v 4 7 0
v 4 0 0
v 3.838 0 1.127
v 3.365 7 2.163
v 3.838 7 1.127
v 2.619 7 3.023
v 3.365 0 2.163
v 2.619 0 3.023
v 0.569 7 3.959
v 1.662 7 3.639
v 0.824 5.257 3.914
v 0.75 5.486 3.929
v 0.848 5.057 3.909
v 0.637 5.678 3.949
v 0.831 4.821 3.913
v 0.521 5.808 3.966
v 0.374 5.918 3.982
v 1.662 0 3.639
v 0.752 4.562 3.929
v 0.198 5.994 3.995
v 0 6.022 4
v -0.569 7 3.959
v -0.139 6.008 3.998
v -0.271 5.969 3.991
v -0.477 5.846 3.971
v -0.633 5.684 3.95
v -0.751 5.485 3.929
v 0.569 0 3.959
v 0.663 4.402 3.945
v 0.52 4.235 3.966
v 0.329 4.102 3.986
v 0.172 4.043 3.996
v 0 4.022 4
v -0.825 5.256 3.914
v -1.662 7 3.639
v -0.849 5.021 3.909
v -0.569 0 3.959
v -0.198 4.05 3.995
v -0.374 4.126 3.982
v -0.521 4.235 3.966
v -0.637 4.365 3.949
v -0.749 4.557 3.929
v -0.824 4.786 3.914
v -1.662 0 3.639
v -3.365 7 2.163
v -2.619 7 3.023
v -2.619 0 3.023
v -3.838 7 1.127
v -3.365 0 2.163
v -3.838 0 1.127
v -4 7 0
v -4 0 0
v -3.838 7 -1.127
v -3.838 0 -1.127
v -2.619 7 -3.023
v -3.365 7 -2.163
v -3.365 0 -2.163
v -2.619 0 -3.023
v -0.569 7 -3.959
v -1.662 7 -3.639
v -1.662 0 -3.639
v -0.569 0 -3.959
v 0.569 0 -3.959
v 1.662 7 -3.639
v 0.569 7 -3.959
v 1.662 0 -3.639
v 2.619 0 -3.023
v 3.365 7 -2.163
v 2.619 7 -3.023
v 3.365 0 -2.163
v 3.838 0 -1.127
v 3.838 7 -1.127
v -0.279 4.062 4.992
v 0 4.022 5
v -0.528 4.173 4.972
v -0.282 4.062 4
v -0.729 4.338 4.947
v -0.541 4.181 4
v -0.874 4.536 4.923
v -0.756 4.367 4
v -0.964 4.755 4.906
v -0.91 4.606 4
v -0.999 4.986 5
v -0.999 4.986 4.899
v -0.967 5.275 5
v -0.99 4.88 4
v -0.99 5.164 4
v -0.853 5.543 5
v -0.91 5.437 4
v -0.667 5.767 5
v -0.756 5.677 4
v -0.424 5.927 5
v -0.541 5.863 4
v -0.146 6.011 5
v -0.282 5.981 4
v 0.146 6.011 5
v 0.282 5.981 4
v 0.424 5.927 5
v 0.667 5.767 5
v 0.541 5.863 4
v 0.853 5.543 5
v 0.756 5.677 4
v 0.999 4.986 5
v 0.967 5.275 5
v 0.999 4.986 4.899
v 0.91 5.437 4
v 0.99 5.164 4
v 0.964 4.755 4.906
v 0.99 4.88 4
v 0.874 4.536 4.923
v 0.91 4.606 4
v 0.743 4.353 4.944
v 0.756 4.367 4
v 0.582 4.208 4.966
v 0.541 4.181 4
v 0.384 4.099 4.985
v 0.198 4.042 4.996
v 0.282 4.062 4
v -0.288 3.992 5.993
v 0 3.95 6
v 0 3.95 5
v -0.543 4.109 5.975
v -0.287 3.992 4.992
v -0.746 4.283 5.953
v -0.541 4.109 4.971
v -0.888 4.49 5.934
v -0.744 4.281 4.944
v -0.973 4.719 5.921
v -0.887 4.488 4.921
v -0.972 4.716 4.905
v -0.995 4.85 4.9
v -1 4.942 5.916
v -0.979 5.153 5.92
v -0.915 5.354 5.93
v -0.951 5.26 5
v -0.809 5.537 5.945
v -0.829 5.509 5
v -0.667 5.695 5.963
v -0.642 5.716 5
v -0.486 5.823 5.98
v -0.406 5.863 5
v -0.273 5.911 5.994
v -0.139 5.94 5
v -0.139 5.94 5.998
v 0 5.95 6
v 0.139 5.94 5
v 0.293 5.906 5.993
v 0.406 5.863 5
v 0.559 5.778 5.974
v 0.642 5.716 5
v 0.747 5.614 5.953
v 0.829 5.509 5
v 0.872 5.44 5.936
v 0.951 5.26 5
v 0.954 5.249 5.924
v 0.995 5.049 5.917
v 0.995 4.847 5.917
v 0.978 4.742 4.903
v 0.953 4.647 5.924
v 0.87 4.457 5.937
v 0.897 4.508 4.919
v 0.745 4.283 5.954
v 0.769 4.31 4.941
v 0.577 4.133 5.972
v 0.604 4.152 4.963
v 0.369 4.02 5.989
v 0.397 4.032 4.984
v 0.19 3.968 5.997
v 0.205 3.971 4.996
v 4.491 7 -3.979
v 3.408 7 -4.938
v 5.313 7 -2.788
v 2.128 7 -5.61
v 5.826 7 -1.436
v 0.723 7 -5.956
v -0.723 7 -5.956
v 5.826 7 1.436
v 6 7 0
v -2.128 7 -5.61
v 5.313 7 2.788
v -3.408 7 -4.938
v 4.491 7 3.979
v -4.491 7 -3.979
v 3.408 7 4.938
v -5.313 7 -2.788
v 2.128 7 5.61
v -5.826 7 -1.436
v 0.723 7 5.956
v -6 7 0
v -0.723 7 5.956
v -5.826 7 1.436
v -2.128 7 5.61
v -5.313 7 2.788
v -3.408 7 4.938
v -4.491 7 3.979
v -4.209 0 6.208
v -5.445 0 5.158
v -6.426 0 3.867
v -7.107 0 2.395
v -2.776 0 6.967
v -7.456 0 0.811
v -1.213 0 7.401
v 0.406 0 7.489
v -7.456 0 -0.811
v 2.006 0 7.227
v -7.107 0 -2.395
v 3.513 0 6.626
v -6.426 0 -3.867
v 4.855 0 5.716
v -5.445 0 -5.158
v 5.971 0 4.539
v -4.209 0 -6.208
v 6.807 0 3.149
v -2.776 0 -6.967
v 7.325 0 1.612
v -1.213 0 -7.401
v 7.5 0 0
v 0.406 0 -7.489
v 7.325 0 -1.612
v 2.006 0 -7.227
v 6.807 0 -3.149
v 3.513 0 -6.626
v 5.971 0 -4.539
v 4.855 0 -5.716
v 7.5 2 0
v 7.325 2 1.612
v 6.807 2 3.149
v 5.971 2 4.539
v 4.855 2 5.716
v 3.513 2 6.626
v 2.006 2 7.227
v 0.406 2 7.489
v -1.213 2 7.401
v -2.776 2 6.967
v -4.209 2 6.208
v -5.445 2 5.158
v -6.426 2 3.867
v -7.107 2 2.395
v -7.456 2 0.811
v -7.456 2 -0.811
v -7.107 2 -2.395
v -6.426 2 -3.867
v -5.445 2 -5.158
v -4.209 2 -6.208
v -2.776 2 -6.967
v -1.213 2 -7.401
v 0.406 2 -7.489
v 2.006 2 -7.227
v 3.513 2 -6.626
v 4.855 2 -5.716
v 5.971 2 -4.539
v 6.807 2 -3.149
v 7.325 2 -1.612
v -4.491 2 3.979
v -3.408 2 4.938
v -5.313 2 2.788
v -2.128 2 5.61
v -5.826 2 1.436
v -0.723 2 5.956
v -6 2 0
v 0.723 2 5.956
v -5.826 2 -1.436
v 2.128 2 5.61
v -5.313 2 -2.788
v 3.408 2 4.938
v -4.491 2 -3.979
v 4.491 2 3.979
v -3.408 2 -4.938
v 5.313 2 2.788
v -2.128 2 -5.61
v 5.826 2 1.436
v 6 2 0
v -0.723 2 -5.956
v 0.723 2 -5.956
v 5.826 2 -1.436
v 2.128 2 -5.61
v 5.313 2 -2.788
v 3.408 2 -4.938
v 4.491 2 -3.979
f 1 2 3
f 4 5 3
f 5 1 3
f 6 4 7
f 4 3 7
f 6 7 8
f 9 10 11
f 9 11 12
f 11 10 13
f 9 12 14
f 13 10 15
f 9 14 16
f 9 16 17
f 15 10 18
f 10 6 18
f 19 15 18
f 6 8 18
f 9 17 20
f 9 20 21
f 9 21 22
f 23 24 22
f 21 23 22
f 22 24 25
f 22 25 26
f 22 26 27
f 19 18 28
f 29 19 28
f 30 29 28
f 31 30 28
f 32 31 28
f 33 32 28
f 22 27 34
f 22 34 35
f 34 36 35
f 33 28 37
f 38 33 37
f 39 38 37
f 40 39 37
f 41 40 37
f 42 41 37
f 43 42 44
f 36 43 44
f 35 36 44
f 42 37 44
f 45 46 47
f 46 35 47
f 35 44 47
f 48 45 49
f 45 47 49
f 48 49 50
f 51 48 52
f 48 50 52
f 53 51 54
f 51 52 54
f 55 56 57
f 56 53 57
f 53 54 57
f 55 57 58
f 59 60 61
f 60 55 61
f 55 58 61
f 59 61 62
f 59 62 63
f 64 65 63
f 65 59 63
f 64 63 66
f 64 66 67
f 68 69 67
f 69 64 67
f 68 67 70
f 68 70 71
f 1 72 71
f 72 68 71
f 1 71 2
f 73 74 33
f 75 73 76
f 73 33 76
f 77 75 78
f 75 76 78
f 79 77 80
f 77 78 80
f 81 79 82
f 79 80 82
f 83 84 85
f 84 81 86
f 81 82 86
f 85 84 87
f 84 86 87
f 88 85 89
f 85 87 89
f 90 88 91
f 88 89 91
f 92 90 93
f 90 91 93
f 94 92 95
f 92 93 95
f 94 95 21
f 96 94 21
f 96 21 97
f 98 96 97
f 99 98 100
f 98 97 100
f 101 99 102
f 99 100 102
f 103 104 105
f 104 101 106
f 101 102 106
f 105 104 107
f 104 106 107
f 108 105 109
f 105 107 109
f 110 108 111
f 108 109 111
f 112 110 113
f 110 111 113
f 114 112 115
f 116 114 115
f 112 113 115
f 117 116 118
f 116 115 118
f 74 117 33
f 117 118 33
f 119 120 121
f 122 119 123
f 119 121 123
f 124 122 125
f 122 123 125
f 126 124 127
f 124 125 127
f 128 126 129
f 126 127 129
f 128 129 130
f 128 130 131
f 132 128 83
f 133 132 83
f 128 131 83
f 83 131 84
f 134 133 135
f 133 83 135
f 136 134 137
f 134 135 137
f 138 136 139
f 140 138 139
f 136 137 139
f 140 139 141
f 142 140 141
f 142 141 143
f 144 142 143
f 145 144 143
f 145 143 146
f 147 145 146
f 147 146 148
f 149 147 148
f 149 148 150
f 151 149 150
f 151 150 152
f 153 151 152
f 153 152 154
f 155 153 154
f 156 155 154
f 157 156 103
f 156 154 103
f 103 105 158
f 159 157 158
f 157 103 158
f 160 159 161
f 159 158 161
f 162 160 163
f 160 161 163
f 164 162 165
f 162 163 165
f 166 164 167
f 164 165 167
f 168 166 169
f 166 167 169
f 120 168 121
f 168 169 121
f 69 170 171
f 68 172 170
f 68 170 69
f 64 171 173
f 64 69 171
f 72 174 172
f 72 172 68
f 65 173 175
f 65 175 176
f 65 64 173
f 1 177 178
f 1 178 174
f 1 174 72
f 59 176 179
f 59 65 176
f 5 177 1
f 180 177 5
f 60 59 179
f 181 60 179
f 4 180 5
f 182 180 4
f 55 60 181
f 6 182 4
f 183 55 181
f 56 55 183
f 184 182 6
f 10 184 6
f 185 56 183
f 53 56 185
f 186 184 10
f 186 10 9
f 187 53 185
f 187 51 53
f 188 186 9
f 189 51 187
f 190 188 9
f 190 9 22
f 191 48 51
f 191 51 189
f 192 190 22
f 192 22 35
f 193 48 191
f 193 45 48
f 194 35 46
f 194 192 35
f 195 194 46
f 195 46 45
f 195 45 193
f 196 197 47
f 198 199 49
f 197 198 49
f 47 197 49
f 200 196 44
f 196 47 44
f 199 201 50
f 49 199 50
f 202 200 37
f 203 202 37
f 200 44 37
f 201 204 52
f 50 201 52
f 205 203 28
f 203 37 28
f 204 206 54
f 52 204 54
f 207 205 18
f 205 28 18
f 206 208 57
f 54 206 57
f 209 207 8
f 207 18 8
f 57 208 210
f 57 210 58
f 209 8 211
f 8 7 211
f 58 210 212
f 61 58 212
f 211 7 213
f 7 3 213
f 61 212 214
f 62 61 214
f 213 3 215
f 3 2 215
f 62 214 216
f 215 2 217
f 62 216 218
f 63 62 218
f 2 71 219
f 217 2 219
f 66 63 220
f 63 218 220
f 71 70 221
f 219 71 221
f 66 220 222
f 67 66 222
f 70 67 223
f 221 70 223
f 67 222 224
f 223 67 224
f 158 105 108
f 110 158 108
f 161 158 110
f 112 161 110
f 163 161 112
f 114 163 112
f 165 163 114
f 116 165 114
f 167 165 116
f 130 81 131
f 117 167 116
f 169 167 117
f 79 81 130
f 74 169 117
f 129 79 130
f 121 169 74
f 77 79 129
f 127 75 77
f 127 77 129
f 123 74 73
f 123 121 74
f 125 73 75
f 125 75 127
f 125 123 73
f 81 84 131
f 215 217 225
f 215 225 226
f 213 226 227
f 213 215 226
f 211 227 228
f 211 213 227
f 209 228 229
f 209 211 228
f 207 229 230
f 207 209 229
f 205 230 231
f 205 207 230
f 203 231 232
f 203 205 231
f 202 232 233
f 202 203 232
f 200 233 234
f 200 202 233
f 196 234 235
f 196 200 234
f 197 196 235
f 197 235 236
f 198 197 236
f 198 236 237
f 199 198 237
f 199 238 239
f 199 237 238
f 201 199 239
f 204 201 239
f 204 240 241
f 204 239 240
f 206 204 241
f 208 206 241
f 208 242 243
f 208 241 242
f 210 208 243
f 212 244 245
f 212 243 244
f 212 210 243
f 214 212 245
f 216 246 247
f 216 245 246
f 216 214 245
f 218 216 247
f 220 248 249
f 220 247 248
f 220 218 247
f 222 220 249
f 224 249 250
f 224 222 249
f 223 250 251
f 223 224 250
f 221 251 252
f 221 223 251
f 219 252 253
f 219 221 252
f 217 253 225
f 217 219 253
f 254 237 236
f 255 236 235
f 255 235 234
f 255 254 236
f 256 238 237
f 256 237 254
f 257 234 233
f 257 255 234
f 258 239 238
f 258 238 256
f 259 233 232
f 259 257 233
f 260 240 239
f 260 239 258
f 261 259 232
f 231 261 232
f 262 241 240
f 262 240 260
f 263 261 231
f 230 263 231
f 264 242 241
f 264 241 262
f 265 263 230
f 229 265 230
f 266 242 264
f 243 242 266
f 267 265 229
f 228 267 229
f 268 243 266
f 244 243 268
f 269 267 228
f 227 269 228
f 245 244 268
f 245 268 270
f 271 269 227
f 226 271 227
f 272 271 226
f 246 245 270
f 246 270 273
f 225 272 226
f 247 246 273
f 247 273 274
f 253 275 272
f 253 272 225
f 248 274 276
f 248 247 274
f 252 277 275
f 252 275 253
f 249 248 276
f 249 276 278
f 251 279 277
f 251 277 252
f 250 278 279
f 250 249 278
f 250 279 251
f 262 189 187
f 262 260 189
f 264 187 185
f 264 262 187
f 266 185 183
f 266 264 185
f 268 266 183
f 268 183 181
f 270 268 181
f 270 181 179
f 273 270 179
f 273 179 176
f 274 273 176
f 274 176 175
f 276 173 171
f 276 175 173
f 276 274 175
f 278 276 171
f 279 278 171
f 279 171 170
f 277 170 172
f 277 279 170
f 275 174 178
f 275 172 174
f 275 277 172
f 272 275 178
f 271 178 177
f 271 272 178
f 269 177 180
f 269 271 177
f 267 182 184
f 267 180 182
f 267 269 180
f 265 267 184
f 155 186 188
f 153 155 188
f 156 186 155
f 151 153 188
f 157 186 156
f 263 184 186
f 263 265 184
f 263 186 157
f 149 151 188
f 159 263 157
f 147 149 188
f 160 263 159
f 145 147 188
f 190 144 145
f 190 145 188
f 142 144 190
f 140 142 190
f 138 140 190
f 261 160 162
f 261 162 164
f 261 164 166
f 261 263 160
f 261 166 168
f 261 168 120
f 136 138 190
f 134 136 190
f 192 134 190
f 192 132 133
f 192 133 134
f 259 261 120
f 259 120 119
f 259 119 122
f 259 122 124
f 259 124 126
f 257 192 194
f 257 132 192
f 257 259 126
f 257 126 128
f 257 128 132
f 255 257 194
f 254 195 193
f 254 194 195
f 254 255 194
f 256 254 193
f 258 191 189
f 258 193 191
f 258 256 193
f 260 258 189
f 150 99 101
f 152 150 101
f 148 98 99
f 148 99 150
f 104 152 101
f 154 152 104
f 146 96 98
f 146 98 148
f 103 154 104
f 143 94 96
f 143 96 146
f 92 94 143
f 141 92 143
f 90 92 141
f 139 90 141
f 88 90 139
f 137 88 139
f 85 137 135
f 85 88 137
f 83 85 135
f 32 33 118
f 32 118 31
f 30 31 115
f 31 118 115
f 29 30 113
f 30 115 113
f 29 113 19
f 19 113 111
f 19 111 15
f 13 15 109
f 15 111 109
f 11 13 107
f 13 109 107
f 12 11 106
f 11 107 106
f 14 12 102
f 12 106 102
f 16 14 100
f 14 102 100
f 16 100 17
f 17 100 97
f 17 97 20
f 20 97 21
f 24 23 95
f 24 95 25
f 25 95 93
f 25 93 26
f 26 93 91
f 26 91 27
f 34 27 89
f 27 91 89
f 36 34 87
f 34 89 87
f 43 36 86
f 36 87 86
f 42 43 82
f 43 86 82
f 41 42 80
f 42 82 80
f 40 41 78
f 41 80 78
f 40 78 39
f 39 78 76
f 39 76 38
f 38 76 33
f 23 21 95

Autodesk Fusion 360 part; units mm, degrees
sketch "Sketch1" plane through (0, 0, 0) normal (0, 1, 0) x (1, 0, 0)
  circle A0 centre (0, 0) radius 5
  circle A1 centre (0, 0) radius 7.5
  dimension "d1" = 15
extrude "Extrude1" add sketch "Sketch1" along normal blind 2
sketch "Sketch2" plane through (0, 2, 0) normal (0, 1, 0) x (-1, 0, 0)
  circle A0 centre (0, 0) radius 5
  circle A1 centre (0, 0) radius 7.5
  circle A2 centre (0, 0) radius 6
extrude "Extrude2" add sketch "Sketch2" along normal blind 5 contours A2
hole "Hole1" at (0, 4.9495, 6) direction (0, 0, -1) diameter 2 depth 6 tip angle 118
sketch "Sketch3" plane through (0, 0, 0) normal (0, 1, 0) x (1, 0, 0)
  circle A0 centre (0, 0) radius 4
  circle A1 centre (0, 0) radius 5
extrude "Extrude3" add sketch "Sketch3" along normal blind 7
hole "Hole2" at (0, 5.0219, 5) direction (0, 0, -1) diameter 2 depth 1 tip angle 118
